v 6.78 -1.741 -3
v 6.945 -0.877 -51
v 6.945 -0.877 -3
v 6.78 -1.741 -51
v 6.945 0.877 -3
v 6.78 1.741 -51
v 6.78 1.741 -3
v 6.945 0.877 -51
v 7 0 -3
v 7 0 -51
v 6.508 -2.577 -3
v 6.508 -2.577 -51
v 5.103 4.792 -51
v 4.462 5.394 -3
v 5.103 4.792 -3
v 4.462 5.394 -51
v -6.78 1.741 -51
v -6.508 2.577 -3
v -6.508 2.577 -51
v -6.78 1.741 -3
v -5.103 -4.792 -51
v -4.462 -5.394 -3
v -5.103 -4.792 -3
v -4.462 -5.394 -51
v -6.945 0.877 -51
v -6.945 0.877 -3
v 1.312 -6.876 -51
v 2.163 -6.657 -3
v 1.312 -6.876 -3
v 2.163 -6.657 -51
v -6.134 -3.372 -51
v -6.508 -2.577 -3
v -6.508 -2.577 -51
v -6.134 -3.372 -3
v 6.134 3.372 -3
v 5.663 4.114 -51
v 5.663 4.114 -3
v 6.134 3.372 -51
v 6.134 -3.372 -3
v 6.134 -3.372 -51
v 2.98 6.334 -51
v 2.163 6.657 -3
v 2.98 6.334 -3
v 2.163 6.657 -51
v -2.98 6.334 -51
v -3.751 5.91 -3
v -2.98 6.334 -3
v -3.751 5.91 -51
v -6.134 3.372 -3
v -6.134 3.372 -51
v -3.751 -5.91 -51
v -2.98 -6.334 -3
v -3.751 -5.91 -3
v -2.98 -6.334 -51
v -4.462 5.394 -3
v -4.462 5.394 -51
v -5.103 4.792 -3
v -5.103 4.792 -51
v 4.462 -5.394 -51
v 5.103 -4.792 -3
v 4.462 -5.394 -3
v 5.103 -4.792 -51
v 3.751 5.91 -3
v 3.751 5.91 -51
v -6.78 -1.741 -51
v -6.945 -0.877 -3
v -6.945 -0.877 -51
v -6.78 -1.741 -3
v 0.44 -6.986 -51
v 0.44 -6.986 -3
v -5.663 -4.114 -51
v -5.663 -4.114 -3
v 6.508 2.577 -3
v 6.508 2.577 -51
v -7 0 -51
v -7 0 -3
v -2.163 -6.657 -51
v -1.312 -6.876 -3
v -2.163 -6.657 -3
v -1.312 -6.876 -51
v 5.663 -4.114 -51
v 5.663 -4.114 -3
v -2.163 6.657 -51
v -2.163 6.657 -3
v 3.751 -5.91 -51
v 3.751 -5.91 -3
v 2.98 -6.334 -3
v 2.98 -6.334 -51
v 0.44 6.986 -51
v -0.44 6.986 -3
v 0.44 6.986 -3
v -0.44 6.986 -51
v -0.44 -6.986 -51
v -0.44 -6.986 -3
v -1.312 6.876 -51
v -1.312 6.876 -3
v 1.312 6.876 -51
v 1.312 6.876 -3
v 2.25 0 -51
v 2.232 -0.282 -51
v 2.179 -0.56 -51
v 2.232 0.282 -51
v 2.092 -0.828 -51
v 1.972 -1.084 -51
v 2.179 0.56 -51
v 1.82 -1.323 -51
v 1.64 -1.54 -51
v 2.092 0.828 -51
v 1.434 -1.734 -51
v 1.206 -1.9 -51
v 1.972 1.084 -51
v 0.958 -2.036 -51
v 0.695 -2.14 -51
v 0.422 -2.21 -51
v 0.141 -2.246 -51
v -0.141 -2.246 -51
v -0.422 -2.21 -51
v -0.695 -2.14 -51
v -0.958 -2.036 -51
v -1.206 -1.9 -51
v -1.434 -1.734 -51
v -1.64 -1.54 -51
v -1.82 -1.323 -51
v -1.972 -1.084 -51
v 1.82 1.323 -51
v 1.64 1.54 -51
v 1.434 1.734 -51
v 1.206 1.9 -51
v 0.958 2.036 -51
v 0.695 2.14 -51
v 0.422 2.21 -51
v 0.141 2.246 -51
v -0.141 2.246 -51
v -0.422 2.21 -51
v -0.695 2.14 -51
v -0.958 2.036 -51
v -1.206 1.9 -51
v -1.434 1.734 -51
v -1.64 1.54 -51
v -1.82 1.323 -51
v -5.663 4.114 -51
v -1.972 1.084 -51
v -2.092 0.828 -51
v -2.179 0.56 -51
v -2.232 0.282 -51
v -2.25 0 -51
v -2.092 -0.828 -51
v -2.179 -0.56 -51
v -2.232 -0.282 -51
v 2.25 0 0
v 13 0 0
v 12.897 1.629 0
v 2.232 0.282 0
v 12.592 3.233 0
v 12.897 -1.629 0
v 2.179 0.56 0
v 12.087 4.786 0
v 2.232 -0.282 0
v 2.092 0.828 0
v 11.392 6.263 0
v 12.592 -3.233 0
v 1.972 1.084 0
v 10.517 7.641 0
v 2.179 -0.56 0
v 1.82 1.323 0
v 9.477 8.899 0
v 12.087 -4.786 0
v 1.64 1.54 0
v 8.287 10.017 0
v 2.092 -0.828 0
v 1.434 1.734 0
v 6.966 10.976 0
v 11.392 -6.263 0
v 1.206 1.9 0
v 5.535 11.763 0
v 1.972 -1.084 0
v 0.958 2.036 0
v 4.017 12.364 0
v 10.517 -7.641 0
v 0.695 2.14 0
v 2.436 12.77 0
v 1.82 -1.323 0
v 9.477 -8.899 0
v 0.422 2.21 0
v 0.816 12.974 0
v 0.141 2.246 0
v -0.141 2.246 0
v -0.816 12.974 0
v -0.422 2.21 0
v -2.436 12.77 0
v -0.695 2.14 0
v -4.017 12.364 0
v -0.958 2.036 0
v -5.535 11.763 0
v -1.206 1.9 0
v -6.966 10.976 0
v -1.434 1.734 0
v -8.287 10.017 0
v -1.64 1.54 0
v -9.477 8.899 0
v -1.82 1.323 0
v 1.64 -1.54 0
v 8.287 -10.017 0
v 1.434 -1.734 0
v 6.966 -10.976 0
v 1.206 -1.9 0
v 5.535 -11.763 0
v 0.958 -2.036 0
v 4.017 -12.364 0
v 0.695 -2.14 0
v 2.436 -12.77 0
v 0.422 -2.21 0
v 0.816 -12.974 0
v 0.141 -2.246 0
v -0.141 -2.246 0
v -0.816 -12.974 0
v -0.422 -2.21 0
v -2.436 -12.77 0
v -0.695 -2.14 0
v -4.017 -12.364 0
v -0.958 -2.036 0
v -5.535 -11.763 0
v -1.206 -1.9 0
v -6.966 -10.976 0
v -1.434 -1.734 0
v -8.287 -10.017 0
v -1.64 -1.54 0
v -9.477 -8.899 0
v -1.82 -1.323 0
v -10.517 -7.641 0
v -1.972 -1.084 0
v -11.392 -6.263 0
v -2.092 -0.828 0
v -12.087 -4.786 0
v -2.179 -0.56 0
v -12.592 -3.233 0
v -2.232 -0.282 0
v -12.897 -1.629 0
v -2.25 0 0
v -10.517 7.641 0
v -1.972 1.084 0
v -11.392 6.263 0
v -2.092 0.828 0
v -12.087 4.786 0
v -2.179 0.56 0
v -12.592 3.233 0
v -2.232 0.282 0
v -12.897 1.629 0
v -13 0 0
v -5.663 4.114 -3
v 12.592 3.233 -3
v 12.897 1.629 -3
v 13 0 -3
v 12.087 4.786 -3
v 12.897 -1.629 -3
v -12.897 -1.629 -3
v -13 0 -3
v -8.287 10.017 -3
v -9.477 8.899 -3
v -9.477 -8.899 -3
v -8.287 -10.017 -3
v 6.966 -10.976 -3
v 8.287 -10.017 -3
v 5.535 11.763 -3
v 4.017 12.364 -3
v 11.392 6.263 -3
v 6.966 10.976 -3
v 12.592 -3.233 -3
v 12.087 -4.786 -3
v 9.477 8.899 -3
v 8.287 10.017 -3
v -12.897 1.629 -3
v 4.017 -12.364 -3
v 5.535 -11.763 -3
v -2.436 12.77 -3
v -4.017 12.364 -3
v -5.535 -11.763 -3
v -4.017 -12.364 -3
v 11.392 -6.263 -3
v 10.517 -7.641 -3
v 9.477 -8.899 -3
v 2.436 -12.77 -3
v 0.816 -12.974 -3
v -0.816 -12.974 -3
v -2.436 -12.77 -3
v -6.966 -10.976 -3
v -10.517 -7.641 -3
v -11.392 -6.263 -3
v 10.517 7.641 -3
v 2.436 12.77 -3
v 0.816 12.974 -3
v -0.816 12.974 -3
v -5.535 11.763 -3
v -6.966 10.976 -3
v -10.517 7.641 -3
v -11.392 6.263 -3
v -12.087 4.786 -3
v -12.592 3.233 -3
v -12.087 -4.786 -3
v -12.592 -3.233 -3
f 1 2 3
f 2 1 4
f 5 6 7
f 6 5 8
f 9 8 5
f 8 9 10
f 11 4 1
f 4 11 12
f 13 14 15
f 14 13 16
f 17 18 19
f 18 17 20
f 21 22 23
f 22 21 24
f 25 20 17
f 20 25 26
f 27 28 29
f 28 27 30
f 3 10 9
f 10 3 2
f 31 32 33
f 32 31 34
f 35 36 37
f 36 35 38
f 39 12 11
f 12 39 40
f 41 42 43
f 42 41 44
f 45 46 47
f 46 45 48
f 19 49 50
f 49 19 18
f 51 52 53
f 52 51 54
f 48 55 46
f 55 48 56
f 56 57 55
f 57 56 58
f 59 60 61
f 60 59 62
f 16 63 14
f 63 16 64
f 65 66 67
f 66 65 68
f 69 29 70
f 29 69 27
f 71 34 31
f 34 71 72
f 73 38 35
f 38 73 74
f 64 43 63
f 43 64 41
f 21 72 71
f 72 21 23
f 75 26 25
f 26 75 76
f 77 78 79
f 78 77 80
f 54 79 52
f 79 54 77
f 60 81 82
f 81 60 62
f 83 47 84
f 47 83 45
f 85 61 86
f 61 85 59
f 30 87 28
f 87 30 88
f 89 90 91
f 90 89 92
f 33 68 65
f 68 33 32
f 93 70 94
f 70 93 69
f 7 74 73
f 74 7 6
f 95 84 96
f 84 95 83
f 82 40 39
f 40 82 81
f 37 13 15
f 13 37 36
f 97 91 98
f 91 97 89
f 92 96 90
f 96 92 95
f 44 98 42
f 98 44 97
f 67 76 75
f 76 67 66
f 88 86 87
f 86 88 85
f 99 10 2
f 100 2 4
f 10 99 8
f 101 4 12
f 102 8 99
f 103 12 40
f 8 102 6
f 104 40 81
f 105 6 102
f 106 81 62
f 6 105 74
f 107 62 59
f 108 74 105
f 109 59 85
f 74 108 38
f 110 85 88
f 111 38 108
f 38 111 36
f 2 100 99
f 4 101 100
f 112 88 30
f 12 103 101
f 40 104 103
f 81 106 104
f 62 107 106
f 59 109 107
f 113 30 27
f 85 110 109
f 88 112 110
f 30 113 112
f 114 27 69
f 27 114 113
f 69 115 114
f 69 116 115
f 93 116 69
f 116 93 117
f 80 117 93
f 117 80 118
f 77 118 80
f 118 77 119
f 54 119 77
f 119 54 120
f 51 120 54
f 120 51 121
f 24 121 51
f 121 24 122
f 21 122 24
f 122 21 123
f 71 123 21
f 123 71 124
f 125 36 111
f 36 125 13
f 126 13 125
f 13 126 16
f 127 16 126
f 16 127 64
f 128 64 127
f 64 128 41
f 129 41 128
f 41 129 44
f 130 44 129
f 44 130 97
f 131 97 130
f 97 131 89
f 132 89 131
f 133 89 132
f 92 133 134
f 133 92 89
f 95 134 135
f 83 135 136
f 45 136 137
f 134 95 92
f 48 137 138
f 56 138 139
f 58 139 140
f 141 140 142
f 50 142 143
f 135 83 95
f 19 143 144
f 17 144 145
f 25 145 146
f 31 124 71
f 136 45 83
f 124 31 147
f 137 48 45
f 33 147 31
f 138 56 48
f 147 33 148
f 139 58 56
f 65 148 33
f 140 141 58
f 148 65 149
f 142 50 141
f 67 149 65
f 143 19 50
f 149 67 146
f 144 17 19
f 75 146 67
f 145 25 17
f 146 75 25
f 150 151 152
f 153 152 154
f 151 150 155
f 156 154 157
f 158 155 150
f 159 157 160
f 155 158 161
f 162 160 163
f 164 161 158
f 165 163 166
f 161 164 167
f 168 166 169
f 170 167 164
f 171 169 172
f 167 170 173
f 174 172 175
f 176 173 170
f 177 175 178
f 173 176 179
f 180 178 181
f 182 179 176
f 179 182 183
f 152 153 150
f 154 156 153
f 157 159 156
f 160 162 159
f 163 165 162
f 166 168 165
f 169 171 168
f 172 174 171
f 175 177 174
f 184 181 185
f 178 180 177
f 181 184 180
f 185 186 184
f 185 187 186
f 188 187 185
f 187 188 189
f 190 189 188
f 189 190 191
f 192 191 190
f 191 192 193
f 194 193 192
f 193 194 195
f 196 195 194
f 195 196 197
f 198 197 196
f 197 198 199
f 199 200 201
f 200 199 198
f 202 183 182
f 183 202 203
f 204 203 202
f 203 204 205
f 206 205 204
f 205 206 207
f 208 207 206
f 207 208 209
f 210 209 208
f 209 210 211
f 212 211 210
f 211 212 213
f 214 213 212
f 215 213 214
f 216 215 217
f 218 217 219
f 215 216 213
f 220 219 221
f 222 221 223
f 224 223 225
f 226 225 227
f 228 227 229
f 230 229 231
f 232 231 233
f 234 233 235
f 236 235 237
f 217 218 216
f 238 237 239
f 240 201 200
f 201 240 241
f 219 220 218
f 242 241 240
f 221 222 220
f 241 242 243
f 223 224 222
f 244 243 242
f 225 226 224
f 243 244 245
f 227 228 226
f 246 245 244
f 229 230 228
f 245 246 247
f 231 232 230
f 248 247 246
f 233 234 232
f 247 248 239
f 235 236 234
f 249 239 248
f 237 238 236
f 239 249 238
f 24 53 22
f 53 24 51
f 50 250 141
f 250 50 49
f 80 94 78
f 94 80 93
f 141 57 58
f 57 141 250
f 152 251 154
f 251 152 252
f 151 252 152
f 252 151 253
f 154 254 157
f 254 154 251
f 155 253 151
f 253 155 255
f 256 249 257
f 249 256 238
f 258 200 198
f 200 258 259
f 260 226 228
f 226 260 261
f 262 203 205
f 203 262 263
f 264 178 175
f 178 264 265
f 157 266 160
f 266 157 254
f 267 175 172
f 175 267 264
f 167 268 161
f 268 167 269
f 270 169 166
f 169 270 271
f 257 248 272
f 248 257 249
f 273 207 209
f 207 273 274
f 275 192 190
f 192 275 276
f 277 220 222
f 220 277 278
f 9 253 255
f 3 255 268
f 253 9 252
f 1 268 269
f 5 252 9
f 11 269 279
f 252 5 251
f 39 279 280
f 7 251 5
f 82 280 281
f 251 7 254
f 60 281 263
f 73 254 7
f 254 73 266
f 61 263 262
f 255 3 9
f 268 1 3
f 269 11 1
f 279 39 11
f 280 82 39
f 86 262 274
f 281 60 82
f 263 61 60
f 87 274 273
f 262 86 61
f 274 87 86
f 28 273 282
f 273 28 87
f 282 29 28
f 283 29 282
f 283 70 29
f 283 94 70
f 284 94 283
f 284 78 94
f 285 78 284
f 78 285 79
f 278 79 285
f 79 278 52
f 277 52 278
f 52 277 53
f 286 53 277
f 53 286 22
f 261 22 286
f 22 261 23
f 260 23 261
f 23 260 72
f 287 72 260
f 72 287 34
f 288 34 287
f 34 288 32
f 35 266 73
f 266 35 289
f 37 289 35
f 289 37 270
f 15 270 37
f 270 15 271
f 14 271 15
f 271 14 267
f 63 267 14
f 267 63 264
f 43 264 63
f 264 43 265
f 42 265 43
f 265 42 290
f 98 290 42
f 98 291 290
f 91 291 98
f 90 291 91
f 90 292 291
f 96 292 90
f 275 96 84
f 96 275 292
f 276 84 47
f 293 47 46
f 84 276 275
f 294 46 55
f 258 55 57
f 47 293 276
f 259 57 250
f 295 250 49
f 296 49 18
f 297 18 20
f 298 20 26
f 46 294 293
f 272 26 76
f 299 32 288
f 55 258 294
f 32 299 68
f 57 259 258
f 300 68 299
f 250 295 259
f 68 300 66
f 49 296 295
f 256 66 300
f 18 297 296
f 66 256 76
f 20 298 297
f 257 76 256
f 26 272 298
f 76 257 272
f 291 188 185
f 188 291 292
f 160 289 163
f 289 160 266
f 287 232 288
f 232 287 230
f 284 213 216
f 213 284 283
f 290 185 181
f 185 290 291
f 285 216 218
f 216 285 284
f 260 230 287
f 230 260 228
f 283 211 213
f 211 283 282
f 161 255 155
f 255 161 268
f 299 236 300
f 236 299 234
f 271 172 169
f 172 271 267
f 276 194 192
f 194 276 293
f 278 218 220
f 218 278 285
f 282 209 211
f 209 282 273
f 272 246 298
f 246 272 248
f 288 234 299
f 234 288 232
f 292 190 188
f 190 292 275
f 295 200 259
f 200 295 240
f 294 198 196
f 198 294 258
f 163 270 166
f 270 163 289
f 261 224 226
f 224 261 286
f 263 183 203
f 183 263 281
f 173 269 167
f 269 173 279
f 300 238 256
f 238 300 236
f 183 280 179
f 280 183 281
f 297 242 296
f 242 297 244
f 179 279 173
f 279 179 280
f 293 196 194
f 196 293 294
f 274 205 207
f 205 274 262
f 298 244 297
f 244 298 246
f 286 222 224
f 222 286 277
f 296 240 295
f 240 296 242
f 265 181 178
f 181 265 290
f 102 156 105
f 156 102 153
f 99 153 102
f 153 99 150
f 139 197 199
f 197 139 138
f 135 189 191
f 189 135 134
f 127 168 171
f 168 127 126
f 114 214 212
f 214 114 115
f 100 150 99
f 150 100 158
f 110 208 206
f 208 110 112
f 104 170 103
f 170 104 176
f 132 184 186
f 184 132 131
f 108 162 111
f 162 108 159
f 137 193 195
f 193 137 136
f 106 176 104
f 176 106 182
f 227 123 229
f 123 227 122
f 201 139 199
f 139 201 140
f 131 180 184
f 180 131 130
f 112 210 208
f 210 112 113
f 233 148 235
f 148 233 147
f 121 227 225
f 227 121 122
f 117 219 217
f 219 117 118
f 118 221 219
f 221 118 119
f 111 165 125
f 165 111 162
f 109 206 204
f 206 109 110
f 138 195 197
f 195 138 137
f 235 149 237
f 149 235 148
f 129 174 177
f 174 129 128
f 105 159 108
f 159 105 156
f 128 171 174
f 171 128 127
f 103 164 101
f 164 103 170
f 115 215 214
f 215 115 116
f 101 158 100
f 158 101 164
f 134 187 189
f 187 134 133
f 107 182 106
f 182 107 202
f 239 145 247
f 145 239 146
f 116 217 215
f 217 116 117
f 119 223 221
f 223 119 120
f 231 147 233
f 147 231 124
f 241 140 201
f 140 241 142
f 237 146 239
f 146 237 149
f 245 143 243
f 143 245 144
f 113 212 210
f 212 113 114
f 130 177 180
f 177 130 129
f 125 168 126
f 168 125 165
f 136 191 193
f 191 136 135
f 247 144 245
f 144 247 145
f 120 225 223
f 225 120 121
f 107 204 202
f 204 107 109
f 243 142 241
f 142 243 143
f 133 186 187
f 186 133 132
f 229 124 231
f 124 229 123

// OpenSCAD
$fn = 50;


difference() {
	union() {
		translate(v = [0, 0, -51.0000000000]) {
			cylinder(h = 51, r = 7.0000000000);
		}
		translate(v = [0, 0, -3.0000000000]) {
			cylinder(h = 3, r = 13.0000000000);
		}
	}
	union() {
		#translate(v = [0, 0, -51]) {
			cylinder(h = 51, r = 2.2500000000);
		}
	}
}
